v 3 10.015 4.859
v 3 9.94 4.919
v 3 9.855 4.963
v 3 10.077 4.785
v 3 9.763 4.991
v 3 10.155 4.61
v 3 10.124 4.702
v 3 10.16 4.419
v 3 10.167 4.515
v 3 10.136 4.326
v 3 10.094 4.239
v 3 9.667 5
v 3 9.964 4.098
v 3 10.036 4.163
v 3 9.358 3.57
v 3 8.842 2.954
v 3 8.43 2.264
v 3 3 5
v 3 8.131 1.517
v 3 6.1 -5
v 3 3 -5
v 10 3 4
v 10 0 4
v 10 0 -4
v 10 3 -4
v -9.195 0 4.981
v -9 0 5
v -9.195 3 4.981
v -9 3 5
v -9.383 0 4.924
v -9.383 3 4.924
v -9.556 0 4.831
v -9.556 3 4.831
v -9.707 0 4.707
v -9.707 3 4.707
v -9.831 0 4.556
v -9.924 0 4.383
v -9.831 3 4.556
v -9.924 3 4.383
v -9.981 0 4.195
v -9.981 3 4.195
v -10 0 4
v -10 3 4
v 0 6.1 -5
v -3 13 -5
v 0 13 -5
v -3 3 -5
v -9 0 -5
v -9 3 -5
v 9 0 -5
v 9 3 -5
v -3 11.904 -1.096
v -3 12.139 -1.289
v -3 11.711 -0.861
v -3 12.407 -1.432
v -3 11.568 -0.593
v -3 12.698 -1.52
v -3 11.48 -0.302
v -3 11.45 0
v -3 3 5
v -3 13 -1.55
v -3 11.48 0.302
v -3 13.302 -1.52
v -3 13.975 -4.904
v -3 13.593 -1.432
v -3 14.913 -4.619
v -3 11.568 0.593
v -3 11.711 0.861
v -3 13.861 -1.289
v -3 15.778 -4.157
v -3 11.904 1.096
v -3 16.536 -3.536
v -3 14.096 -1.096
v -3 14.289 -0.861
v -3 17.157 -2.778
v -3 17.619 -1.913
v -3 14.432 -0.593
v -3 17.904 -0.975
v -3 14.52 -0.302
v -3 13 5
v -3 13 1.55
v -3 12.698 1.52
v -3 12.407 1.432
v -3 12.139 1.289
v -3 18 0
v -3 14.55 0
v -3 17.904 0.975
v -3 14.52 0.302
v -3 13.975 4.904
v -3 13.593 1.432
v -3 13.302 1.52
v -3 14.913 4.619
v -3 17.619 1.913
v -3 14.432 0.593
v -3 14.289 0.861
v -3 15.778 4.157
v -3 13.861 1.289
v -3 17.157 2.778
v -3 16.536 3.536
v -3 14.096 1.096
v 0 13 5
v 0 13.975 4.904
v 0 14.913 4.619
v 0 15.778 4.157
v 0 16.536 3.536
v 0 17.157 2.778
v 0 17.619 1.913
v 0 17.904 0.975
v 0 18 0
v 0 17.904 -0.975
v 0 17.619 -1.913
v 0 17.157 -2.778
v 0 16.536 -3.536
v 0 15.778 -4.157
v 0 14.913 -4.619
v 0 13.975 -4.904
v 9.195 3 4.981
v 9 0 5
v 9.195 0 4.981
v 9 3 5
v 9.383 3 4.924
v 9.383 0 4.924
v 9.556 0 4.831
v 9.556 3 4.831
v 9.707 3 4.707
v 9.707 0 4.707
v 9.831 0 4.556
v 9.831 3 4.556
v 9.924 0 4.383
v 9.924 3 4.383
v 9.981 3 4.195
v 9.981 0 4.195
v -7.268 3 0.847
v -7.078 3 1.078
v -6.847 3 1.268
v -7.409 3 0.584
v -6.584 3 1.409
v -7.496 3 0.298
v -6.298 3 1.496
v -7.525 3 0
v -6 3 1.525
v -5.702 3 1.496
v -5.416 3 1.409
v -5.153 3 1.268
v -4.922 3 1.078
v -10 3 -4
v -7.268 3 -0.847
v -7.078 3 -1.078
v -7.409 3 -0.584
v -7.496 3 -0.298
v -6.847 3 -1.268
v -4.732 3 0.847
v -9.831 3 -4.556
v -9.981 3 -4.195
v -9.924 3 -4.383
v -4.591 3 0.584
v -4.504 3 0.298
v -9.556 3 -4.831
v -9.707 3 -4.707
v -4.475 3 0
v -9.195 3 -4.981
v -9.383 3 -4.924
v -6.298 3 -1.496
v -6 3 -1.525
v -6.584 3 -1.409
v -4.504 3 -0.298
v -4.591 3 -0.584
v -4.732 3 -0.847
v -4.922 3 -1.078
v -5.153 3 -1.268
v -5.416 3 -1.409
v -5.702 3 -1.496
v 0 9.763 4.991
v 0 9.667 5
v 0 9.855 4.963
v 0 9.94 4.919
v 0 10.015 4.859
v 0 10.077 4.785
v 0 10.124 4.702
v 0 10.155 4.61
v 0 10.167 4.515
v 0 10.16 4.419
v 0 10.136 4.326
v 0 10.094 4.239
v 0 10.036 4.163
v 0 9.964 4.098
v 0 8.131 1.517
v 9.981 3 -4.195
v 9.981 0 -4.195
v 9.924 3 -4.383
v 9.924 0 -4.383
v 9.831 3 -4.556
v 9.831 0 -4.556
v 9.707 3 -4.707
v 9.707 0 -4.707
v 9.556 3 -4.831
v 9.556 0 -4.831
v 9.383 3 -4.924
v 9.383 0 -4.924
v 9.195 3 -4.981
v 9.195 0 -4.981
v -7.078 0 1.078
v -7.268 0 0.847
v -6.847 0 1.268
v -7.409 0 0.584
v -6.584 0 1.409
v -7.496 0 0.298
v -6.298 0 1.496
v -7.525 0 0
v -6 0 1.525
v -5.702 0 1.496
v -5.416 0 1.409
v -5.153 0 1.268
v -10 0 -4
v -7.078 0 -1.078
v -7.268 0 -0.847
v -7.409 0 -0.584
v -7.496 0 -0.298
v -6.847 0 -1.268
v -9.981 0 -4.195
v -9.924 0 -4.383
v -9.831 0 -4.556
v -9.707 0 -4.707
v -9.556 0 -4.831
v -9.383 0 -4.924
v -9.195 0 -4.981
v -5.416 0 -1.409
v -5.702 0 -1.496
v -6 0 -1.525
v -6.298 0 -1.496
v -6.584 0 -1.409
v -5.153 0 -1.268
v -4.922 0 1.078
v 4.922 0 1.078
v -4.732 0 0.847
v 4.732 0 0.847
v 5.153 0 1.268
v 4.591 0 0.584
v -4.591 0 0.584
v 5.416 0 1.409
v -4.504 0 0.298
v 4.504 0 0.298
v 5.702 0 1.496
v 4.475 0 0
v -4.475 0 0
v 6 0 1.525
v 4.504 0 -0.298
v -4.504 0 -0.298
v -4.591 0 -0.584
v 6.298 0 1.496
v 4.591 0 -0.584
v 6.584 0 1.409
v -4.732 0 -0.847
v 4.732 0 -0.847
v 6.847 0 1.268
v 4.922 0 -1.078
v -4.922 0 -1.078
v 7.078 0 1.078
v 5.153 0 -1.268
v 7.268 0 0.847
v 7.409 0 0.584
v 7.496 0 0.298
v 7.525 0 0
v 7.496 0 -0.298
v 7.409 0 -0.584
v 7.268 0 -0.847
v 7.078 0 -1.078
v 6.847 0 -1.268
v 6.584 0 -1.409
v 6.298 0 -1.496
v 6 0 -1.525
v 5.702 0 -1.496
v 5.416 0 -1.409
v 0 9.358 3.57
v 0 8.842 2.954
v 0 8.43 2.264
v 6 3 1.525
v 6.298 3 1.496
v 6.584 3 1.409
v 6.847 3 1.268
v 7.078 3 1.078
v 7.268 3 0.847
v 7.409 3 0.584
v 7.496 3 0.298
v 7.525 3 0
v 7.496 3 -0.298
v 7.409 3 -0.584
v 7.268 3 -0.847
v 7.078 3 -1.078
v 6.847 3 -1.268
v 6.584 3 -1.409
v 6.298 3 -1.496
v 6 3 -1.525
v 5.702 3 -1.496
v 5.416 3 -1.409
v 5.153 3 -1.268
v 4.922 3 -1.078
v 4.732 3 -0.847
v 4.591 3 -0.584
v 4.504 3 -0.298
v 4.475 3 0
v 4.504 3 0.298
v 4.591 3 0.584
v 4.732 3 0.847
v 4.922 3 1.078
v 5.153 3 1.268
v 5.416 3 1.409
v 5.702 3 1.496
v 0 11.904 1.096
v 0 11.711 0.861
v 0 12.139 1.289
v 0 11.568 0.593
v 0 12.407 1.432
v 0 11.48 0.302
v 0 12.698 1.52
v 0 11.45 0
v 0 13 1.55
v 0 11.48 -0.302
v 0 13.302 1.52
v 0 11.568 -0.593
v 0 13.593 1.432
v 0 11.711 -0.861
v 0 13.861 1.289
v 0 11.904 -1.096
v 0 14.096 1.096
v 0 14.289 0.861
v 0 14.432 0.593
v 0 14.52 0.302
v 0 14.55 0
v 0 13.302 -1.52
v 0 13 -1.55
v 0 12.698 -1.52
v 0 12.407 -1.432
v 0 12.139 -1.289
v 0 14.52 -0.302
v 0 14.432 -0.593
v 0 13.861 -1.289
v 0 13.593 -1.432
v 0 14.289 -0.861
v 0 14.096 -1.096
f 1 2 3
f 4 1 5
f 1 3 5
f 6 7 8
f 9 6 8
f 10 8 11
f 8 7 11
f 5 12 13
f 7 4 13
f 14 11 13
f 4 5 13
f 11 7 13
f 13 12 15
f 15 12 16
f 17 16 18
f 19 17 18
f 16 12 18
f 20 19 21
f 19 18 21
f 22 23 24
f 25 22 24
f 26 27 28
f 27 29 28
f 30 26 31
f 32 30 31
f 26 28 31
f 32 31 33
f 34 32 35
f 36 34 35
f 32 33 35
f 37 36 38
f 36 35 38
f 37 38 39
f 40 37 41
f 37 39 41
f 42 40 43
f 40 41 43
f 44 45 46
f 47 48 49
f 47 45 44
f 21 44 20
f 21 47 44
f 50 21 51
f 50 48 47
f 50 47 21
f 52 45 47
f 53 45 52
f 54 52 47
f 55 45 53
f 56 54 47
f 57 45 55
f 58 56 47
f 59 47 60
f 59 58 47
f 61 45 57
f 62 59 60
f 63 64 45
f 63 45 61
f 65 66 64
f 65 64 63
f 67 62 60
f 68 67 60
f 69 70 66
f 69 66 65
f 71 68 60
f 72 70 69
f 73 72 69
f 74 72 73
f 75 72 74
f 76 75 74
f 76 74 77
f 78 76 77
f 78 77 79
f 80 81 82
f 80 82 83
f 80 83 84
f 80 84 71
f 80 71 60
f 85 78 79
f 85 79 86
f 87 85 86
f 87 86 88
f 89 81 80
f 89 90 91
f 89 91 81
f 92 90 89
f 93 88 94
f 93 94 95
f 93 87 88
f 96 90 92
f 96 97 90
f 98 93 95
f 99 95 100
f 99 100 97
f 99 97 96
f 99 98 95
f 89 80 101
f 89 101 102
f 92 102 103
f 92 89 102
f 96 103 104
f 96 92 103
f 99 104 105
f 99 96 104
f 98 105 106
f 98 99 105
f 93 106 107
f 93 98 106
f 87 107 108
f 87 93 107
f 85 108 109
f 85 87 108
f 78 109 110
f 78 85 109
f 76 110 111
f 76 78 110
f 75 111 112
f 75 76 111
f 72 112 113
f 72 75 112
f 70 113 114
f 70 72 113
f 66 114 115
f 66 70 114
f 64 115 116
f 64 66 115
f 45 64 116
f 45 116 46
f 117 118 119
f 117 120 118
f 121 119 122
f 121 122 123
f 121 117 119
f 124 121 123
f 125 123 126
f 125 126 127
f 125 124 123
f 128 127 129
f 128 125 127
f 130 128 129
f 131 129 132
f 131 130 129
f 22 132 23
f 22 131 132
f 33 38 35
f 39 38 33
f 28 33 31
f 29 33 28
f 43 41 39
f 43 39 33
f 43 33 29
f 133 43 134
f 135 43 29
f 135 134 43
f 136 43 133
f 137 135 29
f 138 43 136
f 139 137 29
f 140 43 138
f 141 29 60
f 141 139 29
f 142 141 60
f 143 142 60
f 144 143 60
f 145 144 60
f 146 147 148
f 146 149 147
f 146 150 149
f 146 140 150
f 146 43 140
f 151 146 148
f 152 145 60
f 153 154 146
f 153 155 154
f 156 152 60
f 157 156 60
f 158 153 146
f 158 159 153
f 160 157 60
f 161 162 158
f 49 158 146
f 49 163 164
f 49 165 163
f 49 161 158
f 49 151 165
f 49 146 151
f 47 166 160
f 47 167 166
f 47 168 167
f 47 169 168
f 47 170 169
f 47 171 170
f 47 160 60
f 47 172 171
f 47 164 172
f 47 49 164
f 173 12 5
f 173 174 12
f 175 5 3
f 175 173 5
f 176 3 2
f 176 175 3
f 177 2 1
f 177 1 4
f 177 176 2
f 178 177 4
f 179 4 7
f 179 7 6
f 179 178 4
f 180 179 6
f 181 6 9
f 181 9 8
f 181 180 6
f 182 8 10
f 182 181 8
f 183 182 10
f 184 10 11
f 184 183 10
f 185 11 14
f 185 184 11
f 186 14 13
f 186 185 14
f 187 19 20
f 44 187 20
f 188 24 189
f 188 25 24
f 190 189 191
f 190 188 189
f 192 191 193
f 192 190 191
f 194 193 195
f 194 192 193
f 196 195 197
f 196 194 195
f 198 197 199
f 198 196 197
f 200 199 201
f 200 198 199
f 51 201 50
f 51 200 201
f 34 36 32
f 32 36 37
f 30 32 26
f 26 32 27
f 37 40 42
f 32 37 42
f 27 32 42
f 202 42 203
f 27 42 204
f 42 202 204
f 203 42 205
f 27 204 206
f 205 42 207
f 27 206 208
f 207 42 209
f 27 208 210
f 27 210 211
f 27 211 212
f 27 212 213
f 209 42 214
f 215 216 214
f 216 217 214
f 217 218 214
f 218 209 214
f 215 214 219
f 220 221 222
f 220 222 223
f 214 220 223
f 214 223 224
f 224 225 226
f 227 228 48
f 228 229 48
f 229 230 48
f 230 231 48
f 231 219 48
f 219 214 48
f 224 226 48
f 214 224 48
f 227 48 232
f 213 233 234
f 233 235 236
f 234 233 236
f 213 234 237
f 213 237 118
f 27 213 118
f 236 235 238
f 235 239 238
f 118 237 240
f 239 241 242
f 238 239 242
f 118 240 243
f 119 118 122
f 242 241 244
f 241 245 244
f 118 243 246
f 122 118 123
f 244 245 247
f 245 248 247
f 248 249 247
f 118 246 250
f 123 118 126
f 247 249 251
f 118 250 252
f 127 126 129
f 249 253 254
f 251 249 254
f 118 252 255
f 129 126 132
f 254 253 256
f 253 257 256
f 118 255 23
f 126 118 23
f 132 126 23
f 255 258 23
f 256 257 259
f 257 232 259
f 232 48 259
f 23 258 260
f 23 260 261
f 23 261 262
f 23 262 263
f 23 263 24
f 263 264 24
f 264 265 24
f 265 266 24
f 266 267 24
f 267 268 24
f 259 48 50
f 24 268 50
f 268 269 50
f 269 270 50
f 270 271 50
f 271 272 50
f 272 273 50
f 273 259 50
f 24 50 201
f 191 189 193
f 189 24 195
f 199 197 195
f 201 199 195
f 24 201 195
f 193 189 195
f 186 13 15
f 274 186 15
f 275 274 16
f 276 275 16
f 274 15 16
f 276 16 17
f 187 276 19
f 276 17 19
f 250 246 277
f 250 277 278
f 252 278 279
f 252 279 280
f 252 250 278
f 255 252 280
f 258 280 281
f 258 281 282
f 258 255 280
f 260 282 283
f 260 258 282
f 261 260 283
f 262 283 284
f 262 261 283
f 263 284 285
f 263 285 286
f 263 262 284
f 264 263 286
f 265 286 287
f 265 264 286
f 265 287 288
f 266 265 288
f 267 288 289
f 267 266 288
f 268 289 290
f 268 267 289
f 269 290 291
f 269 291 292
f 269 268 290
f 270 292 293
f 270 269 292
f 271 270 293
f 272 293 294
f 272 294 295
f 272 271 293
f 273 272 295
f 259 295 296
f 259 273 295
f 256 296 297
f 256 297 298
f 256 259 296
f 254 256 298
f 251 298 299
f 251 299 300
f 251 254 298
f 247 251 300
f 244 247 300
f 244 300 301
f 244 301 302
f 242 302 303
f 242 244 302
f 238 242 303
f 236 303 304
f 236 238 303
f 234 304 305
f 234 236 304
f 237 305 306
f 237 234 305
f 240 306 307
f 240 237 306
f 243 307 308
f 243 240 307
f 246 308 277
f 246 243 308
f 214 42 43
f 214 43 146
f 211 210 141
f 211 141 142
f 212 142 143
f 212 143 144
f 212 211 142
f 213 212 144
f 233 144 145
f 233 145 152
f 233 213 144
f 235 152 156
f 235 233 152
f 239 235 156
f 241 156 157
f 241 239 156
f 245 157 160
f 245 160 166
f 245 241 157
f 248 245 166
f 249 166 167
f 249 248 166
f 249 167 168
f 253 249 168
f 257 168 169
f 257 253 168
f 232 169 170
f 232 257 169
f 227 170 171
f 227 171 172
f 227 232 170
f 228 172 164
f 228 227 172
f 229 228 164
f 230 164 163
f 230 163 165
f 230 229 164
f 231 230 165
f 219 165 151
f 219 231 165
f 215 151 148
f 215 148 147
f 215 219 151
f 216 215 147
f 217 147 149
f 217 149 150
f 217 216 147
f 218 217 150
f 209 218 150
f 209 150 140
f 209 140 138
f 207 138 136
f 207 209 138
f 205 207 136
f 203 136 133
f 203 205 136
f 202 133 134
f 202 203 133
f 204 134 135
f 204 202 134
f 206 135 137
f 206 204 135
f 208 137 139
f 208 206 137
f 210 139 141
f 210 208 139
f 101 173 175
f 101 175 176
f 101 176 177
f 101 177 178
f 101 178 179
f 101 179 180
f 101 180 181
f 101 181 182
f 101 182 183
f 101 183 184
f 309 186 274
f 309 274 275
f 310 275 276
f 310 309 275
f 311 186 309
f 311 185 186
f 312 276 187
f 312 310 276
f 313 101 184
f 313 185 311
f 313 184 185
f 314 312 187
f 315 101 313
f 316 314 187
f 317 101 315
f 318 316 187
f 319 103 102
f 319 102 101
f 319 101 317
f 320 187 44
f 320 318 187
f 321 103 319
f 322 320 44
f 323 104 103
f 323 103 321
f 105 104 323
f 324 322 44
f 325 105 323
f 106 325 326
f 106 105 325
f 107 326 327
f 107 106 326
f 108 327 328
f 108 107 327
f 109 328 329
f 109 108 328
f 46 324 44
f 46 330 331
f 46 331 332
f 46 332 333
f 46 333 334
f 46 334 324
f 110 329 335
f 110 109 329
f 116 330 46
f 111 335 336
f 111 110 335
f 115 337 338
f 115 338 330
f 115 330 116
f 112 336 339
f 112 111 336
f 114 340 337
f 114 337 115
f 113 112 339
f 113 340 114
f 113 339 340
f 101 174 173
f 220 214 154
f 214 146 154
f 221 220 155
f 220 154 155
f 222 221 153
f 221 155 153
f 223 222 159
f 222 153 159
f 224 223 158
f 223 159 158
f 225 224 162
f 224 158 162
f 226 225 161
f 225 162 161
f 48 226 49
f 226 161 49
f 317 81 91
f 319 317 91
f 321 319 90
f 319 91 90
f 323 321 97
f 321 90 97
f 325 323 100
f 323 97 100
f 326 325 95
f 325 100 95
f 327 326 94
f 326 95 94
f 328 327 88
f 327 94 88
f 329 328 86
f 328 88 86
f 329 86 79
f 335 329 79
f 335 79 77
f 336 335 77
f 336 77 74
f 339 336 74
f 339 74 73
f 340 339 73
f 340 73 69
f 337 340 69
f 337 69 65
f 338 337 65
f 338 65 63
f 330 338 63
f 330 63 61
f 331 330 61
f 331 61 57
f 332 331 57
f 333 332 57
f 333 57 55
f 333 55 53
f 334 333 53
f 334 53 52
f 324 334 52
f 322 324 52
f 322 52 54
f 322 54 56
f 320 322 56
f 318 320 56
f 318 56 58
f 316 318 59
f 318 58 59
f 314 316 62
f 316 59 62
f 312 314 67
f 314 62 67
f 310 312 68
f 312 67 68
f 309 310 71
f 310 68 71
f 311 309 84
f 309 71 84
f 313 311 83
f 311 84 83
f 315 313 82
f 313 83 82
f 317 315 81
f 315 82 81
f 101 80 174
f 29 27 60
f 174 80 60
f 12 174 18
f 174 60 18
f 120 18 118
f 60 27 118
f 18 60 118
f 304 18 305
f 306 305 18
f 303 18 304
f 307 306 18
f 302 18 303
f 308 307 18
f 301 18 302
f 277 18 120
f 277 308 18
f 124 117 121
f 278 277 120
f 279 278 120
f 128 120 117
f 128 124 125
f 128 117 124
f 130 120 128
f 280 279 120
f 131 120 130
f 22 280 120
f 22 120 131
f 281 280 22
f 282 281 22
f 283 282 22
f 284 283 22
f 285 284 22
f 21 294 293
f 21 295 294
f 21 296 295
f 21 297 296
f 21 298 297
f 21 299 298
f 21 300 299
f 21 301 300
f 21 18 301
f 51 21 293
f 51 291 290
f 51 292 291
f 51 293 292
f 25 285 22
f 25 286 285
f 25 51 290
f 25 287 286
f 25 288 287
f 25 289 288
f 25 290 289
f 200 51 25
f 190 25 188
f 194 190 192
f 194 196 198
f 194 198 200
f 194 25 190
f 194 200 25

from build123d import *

# Parameters (mm, degrees)
SKETCH1_W           = 20
SKETCH1_H           = 10
SKETCH1_R           = 1.525
BOSS_EXTRUDE1_DEPTH = 3
SKETCH2_W           = 6
SKETCH2_H           = 10
BOSS_EXTRUDE2_DEPTH = 10
SKETCH3_R           = 5
SKETCH3_R_2         = 1.55
BOSS_EXTRUDE3_DEPTH = 3
CUT_EXTRUDE1_DEPTH  = 6
CUT_EXTRUDE2_START  = -3
SKETCH4_R           = 5
CUT_EXTRUDE2_DEPTH  = 3
FILLET2_R           = 1
CUT_EXTRUDE3_DEPTH  = 3
FILLET4_R           = 0.5
CUT_EXTRUDE4_DEPTH  = 3


with BuildPart() as part:
    # Sketch1 → Boss-Extrude1 (new body)
    with BuildSketch(Plane(origin=(0, 0, 0), x_dir=(1, 0, 0), z_dir=(0, 1, 0))):
        Rectangle(SKETCH1_W, SKETCH1_H)
        with Locations((-6, 0)):
            Circle(SKETCH1_R, mode=Mode.SUBTRACT)
        with Locations((6, 0)):
            Circle(SKETCH1_R, mode=Mode.SUBTRACT)
    extrude(amount=BOSS_EXTRUDE1_DEPTH)

    # Sketch2 → Boss-Extrude2 (add)
    with BuildSketch(Plane(origin=(0, 3, 0), x_dir=(1, 0, 0), z_dir=(0, 1, 0))):
        Rectangle(SKETCH2_W, SKETCH2_H)
    extrude(amount=BOSS_EXTRUDE2_DEPTH)

    # Sketch3 → Boss-Extrude3 (add)
    with BuildSketch(Plane.ZY.offset(3)):
        with Locations((0, 13)):
            Circle(SKETCH3_R)
        with Locations((0, 13)):
            Circle(SKETCH3_R_2, mode=Mode.SUBTRACT)
    extrude(amount=-BOSS_EXTRUDE3_DEPTH)

    # Sketch3<2> → Cut-Extrude1 (cut)
    with BuildSketch(Plane.ZY.offset(3)):
        with BuildLine():
            ThreePointArc((-1.55, 13), (0, 11.45), (1.55, 13))
            Line((1.55, 13), (-1.55, 13))
        make_face()
    extrude(amount=-CUT_EXTRUDE1_DEPTH, mode=Mode.SUBTRACT)

    # Sketch4 → Cut-Extrude2 (cut)
    with BuildSketch(Plane(origin=(3, 0, 0), x_dir=(0, 0, -1), z_dir=(1, 0, 0)).offset(CUT_EXTRUDE2_START)):
        with Locations((0, 13)):
            Circle(SKETCH4_R)
    extrude(amount=CUT_EXTRUDE2_DEPTH, mode=Mode.SUBTRACT)

    # Fillet2
    fillet2_edges = [part.edges().sort_by_distance(p)[0] for p in [
        (-10, 1.5, -5),
        (10, 1.5, -5),
        (10, 1.5, 5),
        (-10, 1.5, 5),
    ]]
    fillet(fillet2_edges, radius=FILLET2_R)

    # Sketch5 → Cut-Extrude3 (cut)
    with BuildSketch(Plane(origin=(3, 0, 0), x_dir=(0, 0, -1), z_dir=(1, 0, 0))):
        with BuildLine():
            Line((1.004987562, 8), (5, 8))
            Line((5, 8), (5, 14.099062692))
            Line((5, 14.099062692), (-5, 14.099062692))
            Line((-5, 14.099062692), (-5, 11.995012438))
            ThreePointArc((-5, 11.995012438), (-2.824900386, 8.753832574), (1.004987562, 8))
        make_face()
    extrude(amount=-CUT_EXTRUDE3_DEPTH, mode=Mode.SUBTRACT)

    # Fillet4
    fillet4_edges = [part.edges().sort_by_distance(p)[0] for p in [
        (1.5, 11.995012438, 5),
    ]]
    fillet(fillet4_edges, radius=FILLET4_R)

    # Sketch7 → Cut-Extrude4 (cut)
    with BuildSketch(Plane(origin=(3, 0, 0), x_dir=(0, 0, -1), z_dir=(1, 0, 0))):
        with BuildLine():
            Line((-1.517307451, 8.13093663), (5, 6.1))
            Line((5, 6.1), (5, 8))
            Line((5, 8), (1.004987562, 8))
            ThreePointArc((1.004987562, 8), (-0.264393679, 7.906857946), (-1.517307451, 8.13093663))
        make_face()
    extrude(amount=-CUT_EXTRUDE4_DEPTH, mode=Mode.SUBTRACT)


solid = part.part
